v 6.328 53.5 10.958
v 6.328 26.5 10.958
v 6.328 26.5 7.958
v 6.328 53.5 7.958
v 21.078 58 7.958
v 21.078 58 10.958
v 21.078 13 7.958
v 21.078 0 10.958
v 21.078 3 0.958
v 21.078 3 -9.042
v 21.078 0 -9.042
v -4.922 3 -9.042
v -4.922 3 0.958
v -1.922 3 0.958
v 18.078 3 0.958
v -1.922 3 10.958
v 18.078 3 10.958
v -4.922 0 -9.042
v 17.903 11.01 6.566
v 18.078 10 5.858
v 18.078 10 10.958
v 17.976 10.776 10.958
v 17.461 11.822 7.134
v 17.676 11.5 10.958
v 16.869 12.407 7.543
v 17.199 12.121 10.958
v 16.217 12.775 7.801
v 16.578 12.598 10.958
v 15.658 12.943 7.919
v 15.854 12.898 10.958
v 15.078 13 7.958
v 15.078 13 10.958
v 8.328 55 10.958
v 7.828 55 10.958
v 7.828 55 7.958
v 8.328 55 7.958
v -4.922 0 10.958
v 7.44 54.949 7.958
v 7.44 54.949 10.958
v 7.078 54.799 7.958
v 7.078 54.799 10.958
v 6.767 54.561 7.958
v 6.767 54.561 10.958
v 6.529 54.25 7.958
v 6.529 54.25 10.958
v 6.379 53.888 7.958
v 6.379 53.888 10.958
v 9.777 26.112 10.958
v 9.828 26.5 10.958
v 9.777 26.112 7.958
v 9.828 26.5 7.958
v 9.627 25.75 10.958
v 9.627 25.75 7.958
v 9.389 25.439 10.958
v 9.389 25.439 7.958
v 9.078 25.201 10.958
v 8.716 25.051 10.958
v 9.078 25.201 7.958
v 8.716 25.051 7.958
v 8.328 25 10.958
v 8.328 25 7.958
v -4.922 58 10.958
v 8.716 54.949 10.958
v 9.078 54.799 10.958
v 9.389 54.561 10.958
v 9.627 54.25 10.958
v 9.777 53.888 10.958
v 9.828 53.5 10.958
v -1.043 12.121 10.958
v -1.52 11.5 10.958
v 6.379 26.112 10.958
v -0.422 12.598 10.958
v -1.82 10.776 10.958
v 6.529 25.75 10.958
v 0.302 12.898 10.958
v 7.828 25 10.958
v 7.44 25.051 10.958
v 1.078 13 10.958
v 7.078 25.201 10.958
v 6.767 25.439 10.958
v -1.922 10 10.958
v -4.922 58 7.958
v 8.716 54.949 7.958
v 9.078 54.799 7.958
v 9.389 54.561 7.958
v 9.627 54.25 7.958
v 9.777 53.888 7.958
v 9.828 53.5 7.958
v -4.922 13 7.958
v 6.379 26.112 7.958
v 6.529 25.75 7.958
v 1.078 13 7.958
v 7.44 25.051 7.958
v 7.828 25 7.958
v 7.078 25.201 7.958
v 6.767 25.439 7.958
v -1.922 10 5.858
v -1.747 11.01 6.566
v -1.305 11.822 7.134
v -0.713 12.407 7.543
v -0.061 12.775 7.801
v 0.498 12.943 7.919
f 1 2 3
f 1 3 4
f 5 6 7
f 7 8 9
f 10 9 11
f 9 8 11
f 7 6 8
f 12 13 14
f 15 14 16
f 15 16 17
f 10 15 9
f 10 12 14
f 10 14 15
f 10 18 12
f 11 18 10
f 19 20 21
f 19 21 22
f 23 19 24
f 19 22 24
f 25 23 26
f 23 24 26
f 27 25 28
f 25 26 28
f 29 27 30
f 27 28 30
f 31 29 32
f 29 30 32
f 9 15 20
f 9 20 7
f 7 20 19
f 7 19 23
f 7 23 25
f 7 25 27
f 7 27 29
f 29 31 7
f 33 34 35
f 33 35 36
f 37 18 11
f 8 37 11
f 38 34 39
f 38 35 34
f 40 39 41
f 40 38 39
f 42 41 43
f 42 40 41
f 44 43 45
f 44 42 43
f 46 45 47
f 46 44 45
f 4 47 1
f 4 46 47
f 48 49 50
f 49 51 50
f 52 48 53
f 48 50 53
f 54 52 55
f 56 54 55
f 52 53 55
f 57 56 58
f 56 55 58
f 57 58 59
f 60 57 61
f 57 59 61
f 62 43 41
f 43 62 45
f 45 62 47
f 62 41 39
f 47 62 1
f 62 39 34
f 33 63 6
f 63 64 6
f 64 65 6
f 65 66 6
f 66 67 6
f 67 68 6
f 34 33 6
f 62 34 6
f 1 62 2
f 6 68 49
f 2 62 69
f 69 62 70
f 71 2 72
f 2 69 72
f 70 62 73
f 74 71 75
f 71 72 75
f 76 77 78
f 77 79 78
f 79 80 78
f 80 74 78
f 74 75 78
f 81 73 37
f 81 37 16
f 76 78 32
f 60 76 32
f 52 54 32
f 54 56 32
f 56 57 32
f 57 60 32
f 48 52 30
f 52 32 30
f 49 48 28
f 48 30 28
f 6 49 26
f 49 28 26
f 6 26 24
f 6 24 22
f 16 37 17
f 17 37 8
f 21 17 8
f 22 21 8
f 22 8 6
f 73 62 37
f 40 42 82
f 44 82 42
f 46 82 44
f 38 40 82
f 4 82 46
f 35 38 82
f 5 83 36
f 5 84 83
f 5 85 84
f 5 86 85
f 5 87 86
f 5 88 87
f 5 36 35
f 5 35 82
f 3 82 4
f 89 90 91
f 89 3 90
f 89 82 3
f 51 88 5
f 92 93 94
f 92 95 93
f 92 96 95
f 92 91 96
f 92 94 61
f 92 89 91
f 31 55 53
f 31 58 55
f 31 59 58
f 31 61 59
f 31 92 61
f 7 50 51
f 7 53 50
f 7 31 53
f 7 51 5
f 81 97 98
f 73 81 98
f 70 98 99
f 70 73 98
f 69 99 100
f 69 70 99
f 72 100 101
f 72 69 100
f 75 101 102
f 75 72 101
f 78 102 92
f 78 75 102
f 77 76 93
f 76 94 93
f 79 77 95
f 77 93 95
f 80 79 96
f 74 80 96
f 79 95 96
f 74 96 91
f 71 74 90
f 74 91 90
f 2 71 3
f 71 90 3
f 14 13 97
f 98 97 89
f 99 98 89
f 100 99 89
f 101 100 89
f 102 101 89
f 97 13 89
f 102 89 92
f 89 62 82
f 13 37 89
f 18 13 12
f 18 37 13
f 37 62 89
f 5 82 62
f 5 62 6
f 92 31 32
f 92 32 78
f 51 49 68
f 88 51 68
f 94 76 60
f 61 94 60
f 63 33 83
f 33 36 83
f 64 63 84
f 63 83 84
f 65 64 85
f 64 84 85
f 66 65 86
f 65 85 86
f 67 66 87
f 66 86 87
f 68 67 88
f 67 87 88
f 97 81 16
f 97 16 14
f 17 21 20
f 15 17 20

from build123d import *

# Parameters (mm, degrees)
ESBO_O1_W                = 26
ESBO_O1_H                = 20
RESSALTO_EXTRUS_O1_DEPTH = 3
ESBO_O2_W                = 26
ESBO_O2_H                = 3
RESSALTO_EXTRUS_O2_DEPTH = 55
ESBO_O3_W                = 3
ESBO_O3_H                = 7
RESSALTO_EXTRUS_O3_DEPTH = 10
CORTE_EXTRUS_O1_DEPTH    = 65.498700042
CORTE_EXTRUS_O2_REACH    = 66.01
ESBO_O6_W                = 20
ESBO_O6_H                = 10
FILETE1_R                = 3
CORTE_EXTRUS_O3_REACH    = 66.871
ESBO_O7_W                = 1.75
ESBO_O7_H                = 30
FILETE2_R                = 1.5


with BuildPart() as part:
    # Esboço1 → Ressalto-extrusão1 (new body)
    with BuildSketch(Plane(origin=(0, 0, 0), x_dir=(1, 0, 0), z_dir=(0, 1, 0))):
        with Locations((8.077993659, -0.958207295)):
            Rectangle(ESBO_O1_W, ESBO_O1_H)
    extrude(amount=RESSALTO_EXTRUS_O1_DEPTH)

    # Esboço2 → Ressalto-extrusão2 (add)
    with BuildSketch(Plane(origin=(0, 3, 0), x_dir=(1, 0, 0), z_dir=(0, 1, 0))):
        with Locations((8.077993659, -9.458207295)):
            Rectangle(ESBO_O2_W, ESBO_O2_H)
    extrude(amount=RESSALTO_EXTRUS_O2_DEPTH)

    # Esboço3 → Ressalto-extrusão3 (add)
    with BuildSketch(Plane(origin=(0, 3, 0), x_dir=(1, 0, 0), z_dir=(0, 1, 0))):
        with Locations((19.577993659, -4.458207295)):
            Rectangle(ESBO_O3_W, ESBO_O3_H)
        with Locations((-3.422006341, -4.458207295)):
            Rectangle(ESBO_O3_W, ESBO_O3_H)
    extrude(amount=RESSALTO_EXTRUS_O3_DEPTH)

    # Esboço4 → Corte-extrusão1 (cut, through all)
    with BuildSketch(Plane.ZY.offset(4.922006341)):
        Polygon((0.958207295, 3), (7.958207295, 13), (0.958207295, 13), align=None)
    extrude(amount=-CORTE_EXTRUS_O1_DEPTH, mode=Mode.SUBTRACT)

    # Esboço6 → Corte-extrusão2 (cut, up to next)
    with BuildSketch(Plane(origin=(0, 0, 7.958207295), x_dir=(-1, 0, 0), z_dir=(0, 0, -1)), mode=Mode.PRIVATE) as corte_extrus_o2_sk1:
        with Locations((-8.077993659, 8)):
            Rectangle(ESBO_O6_W, ESBO_O6_H)
    corte_extrus_o2_tool1 = extrude(corte_extrus_o2_sk1.sketch, amount=-CORTE_EXTRUS_O2_REACH, mode=Mode.PRIVATE) & part.part
    add(corte_extrus_o2_tool1.solids().sort_by_distance((8.077994, 8, 7.958207))[0], mode=Mode.SUBTRACT)

    # Filete1
    filete1_edges = [part.edges().sort_by_distance(p)[0] for p in [
        (18.077993659, 13, 9.458207295),
        (-1.922006341, 13, 9.458207295),
    ]]
    fillet(filete1_edges, radius=FILETE1_R)

    # Esboço7 → Corte-extrusão3 (cut, up to next)
    with BuildSketch(Plane.XY.offset(10.958207295), mode=Mode.PRIVATE) as corte_extrus_o3_sk1:
        with Locations((7.202993659, 40)):
            Rectangle(ESBO_O7_W, ESBO_O7_H)
    corte_extrus_o3_tool1 = extrude(corte_extrus_o3_sk1.sketch, amount=-CORTE_EXTRUS_O3_REACH, mode=Mode.PRIVATE) & part.part
    # Esboço7 → Corte-extrusão3 (cut, up to next)
    with BuildSketch(Plane.XY.offset(10.958207295), mode=Mode.PRIVATE) as corte_extrus_o3_sk2:
        with Locations((8.952993659, 40)):
            Rectangle(ESBO_O7_W, ESBO_O7_H)
    corte_extrus_o3_tool2 = extrude(corte_extrus_o3_sk2.sketch, amount=-CORTE_EXTRUS_O3_REACH, mode=Mode.PRIVATE) & part.part
    add(corte_extrus_o3_tool1.solids().sort_by_distance((7.202994, 40, 10.958207))[0], mode=Mode.SUBTRACT)
    add(corte_extrus_o3_tool2.solids().sort_by_distance((8.952994, 40, 10.958207))[0], mode=Mode.SUBTRACT)

    # Filete2
    filete2_edges = [part.edges().sort_by_distance(p)[0] for p in [
        (9.827993659, 25, 9.458207295),
        (6.327993659, 25, 9.458207295),
        (6.327993659, 55, 9.458207295),
        (9.827993659, 55, 9.458207295),
    ]]
    fillet(filete2_edges, radius=FILETE2_R)


solid = part.part
